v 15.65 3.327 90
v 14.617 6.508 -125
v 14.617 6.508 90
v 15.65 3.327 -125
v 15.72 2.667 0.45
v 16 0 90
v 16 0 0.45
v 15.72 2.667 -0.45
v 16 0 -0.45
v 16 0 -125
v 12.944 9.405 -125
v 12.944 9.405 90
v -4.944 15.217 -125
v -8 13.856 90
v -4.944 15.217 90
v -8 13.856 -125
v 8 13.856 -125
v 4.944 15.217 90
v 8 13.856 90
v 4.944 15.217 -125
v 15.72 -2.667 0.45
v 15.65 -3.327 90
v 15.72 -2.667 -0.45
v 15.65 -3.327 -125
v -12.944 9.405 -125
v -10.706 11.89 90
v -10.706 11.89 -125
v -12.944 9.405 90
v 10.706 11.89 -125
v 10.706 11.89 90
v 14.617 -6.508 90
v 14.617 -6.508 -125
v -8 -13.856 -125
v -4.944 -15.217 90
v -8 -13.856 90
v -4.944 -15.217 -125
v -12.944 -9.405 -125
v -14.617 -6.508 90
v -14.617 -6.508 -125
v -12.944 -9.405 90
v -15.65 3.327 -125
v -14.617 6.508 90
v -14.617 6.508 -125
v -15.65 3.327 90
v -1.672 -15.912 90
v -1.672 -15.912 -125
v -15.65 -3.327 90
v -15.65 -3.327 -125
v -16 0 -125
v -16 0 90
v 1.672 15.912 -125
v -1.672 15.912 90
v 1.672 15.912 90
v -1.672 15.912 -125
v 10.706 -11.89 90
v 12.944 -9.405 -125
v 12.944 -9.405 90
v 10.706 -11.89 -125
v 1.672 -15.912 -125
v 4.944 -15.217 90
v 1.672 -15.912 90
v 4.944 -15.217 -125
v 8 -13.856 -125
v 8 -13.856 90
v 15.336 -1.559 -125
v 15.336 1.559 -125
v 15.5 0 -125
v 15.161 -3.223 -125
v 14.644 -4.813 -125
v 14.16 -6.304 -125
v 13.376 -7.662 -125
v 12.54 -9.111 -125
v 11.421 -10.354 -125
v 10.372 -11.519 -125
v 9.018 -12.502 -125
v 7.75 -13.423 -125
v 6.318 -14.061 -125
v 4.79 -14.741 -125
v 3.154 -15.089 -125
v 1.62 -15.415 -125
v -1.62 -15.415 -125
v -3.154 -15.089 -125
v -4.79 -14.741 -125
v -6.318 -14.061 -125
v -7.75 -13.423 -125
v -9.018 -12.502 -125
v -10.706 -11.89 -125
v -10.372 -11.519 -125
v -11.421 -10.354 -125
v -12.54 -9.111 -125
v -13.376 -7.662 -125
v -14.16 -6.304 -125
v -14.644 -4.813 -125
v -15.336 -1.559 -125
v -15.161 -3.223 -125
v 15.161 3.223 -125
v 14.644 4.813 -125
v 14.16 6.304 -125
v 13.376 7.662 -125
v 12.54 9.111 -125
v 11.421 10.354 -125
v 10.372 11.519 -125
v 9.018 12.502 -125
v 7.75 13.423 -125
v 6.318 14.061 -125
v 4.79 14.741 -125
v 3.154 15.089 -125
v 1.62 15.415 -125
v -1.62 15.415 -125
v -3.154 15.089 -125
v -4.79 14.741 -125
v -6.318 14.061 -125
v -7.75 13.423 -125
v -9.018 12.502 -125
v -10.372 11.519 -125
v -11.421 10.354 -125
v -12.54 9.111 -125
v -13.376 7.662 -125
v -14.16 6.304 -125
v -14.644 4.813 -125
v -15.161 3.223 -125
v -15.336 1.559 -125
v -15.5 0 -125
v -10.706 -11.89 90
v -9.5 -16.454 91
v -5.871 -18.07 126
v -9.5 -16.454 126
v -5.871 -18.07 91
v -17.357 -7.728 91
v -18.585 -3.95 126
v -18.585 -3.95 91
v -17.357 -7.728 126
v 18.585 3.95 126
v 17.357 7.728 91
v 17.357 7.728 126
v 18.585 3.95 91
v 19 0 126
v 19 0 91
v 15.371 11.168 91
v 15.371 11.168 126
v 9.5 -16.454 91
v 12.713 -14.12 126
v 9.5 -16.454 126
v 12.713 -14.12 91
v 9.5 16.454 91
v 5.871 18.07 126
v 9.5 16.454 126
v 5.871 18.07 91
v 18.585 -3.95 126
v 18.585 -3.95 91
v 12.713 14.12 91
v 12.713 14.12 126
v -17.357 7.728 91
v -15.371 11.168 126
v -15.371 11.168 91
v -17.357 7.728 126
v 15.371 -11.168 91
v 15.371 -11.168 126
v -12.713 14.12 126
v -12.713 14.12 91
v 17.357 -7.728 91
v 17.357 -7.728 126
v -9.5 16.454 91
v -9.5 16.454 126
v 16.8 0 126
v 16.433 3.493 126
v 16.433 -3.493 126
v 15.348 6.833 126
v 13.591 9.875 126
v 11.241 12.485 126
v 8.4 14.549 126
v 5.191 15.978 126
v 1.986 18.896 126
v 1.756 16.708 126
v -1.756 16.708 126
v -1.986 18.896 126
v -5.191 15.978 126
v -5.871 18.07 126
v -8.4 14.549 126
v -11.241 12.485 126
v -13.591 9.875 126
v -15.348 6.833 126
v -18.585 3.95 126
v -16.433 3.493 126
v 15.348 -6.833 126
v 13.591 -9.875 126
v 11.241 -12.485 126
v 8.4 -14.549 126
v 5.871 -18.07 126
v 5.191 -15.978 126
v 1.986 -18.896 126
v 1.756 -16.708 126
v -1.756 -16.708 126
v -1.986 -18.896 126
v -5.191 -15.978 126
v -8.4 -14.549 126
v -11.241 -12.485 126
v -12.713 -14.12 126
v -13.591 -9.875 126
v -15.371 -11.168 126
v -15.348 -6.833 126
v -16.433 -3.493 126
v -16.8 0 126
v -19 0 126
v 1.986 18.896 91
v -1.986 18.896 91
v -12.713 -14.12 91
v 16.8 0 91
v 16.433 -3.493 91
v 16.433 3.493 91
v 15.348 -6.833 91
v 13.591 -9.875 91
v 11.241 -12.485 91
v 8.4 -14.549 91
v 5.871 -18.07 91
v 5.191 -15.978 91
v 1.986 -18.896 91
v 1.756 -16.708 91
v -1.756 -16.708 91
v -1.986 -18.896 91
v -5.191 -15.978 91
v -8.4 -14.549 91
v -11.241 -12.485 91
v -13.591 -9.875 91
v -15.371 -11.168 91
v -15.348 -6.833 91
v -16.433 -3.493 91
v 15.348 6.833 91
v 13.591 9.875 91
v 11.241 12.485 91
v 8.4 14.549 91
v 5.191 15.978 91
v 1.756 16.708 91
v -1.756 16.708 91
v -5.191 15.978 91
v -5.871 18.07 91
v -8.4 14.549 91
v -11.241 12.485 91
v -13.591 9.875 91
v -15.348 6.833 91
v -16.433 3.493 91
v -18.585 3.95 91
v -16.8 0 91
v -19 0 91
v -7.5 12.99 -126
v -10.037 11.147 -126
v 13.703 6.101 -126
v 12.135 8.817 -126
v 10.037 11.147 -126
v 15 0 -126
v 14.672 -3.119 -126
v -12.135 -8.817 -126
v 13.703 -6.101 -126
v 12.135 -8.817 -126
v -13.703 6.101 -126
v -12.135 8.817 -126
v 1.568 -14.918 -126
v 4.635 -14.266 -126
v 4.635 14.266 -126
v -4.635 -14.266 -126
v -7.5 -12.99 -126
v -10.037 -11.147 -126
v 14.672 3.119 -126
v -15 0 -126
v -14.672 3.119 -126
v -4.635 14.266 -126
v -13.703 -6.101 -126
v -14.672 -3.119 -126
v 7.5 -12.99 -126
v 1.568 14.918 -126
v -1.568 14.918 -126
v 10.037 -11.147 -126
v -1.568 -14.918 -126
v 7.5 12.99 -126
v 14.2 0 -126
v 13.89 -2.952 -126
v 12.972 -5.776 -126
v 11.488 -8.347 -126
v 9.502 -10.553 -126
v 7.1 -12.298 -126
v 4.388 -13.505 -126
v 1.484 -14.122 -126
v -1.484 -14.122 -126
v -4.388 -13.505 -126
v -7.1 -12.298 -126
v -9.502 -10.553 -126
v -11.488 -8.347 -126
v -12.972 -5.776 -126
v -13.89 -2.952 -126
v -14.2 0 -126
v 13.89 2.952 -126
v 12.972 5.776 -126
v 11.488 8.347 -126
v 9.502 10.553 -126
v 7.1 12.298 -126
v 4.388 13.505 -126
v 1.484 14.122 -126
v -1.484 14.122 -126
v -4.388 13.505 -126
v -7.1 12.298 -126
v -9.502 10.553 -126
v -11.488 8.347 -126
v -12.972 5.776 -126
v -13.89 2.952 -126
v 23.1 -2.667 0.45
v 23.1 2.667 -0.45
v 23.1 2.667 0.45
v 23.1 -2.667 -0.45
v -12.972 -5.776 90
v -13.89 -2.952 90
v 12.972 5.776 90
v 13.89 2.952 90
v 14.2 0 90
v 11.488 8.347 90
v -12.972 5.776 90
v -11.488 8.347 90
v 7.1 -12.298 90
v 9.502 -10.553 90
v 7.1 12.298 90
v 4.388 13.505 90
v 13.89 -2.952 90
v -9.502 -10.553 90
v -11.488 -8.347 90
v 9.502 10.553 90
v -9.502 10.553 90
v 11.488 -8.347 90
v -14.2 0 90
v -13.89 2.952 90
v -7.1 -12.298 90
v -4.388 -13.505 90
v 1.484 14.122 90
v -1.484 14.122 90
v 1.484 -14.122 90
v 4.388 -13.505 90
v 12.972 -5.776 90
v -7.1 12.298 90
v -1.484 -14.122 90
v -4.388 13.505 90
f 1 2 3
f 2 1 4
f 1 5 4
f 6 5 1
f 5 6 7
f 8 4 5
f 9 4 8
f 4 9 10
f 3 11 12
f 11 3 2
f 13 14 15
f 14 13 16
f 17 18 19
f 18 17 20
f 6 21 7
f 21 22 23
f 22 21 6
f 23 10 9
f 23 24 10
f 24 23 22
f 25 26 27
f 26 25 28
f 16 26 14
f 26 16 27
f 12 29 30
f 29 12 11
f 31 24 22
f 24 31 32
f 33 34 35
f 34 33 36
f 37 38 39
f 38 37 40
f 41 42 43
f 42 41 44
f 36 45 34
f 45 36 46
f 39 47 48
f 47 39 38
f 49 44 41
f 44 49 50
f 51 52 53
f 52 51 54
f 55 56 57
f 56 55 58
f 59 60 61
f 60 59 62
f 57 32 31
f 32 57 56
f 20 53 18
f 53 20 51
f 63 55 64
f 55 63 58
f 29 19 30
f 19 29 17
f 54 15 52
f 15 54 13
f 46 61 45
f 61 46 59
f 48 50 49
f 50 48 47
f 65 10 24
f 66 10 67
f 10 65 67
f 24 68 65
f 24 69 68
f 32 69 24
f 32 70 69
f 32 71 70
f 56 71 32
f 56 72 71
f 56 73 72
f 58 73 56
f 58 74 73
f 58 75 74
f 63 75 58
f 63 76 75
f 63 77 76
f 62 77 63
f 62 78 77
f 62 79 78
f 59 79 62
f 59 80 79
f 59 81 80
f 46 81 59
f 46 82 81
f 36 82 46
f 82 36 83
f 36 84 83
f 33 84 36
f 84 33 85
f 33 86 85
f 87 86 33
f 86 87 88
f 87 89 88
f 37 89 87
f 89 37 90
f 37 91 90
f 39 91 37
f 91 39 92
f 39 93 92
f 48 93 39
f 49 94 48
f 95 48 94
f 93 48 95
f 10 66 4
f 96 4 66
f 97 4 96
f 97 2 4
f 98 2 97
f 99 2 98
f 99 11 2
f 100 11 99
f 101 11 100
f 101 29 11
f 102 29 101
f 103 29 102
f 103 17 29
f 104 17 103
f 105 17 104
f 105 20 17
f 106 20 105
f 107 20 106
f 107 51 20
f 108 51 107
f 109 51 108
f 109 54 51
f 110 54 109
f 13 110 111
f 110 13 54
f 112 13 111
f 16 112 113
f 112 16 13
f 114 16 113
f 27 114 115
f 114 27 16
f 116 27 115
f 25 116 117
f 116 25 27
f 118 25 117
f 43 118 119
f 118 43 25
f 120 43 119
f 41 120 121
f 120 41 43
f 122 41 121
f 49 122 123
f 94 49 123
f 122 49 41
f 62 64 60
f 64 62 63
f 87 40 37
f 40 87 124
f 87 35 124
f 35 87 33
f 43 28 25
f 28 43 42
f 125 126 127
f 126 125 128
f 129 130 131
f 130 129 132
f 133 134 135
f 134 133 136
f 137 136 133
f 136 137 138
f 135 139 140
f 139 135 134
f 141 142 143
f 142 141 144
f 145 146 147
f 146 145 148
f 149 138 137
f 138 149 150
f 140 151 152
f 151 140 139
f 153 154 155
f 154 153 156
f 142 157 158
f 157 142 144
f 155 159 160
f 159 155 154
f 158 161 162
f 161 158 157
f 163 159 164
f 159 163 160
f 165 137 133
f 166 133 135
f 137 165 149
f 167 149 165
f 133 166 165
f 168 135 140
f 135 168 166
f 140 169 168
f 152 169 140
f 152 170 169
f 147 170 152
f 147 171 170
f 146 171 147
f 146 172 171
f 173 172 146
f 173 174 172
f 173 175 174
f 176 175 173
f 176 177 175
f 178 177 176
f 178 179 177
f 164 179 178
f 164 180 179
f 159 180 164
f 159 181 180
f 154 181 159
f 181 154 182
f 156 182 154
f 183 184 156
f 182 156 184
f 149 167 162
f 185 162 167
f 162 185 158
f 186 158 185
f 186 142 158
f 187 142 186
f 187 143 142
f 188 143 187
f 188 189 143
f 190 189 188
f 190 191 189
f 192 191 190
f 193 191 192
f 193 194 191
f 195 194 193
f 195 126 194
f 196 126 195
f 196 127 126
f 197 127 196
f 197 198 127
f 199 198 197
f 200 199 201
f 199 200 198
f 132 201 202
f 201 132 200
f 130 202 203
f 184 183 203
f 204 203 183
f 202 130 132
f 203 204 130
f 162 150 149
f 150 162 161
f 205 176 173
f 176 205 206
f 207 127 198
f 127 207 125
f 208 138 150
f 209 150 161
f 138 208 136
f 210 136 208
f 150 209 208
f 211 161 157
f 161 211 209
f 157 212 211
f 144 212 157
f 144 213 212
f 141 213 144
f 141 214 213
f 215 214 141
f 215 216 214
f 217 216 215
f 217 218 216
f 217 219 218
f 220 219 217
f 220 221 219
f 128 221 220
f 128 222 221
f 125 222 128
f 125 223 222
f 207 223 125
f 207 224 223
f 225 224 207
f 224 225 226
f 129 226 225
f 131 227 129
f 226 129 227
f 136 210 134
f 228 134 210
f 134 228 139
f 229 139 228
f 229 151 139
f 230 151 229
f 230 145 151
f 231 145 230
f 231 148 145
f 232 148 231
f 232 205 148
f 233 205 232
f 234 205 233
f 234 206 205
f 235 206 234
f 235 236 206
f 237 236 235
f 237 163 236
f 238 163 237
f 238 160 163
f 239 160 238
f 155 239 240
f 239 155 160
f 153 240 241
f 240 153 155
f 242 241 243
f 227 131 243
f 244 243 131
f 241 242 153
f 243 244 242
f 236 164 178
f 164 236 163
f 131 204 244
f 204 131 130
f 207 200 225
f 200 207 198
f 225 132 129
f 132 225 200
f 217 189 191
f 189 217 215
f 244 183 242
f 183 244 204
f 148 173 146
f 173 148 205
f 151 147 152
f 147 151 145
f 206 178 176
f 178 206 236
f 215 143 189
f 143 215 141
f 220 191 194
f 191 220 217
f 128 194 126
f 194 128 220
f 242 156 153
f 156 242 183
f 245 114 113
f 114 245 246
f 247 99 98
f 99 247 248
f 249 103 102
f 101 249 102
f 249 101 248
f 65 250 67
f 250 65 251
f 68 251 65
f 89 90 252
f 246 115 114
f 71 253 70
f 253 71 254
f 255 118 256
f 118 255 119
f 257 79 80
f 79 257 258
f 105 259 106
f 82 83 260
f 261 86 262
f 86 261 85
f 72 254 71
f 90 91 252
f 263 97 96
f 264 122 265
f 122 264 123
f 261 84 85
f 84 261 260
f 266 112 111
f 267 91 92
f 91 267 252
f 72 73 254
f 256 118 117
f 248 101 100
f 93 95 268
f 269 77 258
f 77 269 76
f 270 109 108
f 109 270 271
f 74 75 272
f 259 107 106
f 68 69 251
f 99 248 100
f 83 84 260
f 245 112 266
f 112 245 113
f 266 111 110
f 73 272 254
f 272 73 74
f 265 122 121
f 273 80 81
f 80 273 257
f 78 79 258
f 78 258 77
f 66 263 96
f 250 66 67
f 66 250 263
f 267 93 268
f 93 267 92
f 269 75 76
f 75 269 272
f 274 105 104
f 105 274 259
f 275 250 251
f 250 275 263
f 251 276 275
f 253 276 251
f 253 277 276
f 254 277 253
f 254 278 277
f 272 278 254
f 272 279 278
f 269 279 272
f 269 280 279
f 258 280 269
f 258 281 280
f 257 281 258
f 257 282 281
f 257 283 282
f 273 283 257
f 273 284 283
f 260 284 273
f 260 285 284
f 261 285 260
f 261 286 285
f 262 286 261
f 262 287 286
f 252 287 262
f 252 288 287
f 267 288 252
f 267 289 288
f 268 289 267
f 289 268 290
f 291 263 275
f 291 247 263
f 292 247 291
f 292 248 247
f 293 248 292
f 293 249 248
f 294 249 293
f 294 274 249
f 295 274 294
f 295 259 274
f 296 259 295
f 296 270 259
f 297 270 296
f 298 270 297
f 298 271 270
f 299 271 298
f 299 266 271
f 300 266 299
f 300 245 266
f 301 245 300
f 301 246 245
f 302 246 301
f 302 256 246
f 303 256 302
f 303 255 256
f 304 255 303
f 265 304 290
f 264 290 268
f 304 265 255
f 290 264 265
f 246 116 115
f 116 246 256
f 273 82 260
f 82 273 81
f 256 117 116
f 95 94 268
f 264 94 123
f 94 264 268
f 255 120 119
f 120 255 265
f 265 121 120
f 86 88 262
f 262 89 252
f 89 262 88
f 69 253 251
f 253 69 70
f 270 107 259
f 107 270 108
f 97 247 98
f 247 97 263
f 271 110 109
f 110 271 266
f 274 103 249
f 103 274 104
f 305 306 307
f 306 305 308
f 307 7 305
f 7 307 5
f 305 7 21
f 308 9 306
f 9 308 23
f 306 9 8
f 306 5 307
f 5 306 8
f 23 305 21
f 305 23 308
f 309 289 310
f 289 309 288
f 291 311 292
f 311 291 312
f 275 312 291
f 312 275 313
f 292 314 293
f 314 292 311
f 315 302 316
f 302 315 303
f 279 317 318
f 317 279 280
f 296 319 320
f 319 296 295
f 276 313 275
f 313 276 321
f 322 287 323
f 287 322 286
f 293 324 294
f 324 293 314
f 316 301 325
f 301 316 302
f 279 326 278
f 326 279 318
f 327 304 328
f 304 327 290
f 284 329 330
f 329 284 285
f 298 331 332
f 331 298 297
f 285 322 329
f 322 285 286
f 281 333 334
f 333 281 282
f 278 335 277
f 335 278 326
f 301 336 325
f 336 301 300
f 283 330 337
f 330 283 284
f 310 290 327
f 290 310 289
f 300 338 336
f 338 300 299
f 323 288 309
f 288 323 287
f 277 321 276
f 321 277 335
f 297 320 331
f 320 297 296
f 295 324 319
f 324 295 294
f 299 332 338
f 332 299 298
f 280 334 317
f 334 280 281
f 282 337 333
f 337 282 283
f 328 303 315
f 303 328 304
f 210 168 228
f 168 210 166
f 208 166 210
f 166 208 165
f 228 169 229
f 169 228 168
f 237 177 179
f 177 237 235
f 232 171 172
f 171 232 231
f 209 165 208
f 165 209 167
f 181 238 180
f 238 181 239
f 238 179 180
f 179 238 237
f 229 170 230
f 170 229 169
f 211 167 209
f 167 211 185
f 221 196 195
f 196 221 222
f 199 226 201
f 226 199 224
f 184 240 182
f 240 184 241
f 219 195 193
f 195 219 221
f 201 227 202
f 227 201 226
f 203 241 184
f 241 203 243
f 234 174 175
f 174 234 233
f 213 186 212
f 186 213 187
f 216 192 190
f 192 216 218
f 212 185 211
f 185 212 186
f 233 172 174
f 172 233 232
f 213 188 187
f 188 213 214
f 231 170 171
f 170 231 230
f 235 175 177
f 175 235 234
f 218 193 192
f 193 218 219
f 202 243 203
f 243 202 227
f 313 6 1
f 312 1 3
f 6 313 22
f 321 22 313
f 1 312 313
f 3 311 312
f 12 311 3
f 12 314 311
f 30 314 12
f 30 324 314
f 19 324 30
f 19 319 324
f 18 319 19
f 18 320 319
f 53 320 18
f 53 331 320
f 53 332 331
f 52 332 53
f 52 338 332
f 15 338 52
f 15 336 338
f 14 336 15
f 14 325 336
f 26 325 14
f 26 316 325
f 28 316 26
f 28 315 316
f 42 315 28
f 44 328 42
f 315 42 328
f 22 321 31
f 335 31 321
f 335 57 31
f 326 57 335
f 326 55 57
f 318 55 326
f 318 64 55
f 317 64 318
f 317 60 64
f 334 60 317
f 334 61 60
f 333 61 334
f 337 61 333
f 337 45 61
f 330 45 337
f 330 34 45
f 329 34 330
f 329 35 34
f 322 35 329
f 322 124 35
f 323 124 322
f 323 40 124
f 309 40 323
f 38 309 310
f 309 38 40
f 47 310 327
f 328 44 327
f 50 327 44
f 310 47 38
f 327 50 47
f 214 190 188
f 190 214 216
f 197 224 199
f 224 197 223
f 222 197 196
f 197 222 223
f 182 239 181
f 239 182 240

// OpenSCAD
// Parameters
pipe_length = 250; //[125:500:1]
outer_diameter = 32; //[16:64:0.5]
wall_thickness = 1.8; //[0.9:3.6:0.1]
socket_length = 35; //[18:70:1]
socket_outer_diameter = 38; //[34:50:0.5]
socket_wall_thickness = 2.2; //[1.2:4.4:0.1]
chamfer_length = 2; //[1:6:0.5]
chamfer_radial = 1; //[0.5:3:0.25]
overlap = 1; //[0.5:2:0.1]

// Base Shapes
module pipe_body_outer() {
  cylinder(h=pipe_length, r=outer_diameter/2, center=true);
}

module hollow_bore_main() {
  cylinder(h=pipe_length + 2*overlap, r=outer_diameter/2 - wall_thickness, center=true);
}

module socket_end_outer() {
  translate([0, 0, pipe_length/2 - socket_length/2 + overlap])
    cylinder(h=socket_length, r=socket_outer_diameter/2, center=true);
}

module socket_end_bore() {
  translate([0, 0, pipe_length/2 - socket_length/2 + overlap])
    cylinder(h=socket_length + 2*overlap, r=socket_outer_diameter/2 - socket_wall_thickness, center=true);
}

module end_chamfer_socket_outer() {
  translate([0, 0, pipe_length/2 - chamfer_length/2 + overlap])
    cylinder(h=chamfer_length, r1=socket_outer_diameter/2, r2=socket_outer_diameter/2 - chamfer_radial, center=true);
}

module end_chamfer_plain_outer() {
  translate([0, 0, -pipe_length/2 + chamfer_length/2 - overlap])
    rotate([180, 0, 0])
    cylinder(h=chamfer_length, r1=outer_diameter/2, r2=outer_diameter/2 - chamfer_radial, center=true);
}

module manufacturer_markings() {
  translate([outer_diameter/2 - wall_thickness/2, 0, 0])
    cube([outer_diameter/2, outer_diameter/6, wall_thickness/2], center=true);
}

// Operations
module pipe_body_with_socket() {
  union() {
    pipe_body_outer();
    socket_end_outer();
  }
}

module pipe_body_with_socket_and_chamfers() {
  union() {
    pipe_body_with_socket();
    end_chamfer_socket_outer();
    end_chamfer_plain_outer();
  }
}

module pipe_body_with_details() {
  union() {
    pipe_body_with_socket_and_chamfers();
    manufacturer_markings();
  }
}

module hollow_bore() {
  union() {
    hollow_bore_main();
    socket_end_bore();
  }
}

// Final Output
difference() {
  pipe_body_with_details();
  hollow_bore();
}
